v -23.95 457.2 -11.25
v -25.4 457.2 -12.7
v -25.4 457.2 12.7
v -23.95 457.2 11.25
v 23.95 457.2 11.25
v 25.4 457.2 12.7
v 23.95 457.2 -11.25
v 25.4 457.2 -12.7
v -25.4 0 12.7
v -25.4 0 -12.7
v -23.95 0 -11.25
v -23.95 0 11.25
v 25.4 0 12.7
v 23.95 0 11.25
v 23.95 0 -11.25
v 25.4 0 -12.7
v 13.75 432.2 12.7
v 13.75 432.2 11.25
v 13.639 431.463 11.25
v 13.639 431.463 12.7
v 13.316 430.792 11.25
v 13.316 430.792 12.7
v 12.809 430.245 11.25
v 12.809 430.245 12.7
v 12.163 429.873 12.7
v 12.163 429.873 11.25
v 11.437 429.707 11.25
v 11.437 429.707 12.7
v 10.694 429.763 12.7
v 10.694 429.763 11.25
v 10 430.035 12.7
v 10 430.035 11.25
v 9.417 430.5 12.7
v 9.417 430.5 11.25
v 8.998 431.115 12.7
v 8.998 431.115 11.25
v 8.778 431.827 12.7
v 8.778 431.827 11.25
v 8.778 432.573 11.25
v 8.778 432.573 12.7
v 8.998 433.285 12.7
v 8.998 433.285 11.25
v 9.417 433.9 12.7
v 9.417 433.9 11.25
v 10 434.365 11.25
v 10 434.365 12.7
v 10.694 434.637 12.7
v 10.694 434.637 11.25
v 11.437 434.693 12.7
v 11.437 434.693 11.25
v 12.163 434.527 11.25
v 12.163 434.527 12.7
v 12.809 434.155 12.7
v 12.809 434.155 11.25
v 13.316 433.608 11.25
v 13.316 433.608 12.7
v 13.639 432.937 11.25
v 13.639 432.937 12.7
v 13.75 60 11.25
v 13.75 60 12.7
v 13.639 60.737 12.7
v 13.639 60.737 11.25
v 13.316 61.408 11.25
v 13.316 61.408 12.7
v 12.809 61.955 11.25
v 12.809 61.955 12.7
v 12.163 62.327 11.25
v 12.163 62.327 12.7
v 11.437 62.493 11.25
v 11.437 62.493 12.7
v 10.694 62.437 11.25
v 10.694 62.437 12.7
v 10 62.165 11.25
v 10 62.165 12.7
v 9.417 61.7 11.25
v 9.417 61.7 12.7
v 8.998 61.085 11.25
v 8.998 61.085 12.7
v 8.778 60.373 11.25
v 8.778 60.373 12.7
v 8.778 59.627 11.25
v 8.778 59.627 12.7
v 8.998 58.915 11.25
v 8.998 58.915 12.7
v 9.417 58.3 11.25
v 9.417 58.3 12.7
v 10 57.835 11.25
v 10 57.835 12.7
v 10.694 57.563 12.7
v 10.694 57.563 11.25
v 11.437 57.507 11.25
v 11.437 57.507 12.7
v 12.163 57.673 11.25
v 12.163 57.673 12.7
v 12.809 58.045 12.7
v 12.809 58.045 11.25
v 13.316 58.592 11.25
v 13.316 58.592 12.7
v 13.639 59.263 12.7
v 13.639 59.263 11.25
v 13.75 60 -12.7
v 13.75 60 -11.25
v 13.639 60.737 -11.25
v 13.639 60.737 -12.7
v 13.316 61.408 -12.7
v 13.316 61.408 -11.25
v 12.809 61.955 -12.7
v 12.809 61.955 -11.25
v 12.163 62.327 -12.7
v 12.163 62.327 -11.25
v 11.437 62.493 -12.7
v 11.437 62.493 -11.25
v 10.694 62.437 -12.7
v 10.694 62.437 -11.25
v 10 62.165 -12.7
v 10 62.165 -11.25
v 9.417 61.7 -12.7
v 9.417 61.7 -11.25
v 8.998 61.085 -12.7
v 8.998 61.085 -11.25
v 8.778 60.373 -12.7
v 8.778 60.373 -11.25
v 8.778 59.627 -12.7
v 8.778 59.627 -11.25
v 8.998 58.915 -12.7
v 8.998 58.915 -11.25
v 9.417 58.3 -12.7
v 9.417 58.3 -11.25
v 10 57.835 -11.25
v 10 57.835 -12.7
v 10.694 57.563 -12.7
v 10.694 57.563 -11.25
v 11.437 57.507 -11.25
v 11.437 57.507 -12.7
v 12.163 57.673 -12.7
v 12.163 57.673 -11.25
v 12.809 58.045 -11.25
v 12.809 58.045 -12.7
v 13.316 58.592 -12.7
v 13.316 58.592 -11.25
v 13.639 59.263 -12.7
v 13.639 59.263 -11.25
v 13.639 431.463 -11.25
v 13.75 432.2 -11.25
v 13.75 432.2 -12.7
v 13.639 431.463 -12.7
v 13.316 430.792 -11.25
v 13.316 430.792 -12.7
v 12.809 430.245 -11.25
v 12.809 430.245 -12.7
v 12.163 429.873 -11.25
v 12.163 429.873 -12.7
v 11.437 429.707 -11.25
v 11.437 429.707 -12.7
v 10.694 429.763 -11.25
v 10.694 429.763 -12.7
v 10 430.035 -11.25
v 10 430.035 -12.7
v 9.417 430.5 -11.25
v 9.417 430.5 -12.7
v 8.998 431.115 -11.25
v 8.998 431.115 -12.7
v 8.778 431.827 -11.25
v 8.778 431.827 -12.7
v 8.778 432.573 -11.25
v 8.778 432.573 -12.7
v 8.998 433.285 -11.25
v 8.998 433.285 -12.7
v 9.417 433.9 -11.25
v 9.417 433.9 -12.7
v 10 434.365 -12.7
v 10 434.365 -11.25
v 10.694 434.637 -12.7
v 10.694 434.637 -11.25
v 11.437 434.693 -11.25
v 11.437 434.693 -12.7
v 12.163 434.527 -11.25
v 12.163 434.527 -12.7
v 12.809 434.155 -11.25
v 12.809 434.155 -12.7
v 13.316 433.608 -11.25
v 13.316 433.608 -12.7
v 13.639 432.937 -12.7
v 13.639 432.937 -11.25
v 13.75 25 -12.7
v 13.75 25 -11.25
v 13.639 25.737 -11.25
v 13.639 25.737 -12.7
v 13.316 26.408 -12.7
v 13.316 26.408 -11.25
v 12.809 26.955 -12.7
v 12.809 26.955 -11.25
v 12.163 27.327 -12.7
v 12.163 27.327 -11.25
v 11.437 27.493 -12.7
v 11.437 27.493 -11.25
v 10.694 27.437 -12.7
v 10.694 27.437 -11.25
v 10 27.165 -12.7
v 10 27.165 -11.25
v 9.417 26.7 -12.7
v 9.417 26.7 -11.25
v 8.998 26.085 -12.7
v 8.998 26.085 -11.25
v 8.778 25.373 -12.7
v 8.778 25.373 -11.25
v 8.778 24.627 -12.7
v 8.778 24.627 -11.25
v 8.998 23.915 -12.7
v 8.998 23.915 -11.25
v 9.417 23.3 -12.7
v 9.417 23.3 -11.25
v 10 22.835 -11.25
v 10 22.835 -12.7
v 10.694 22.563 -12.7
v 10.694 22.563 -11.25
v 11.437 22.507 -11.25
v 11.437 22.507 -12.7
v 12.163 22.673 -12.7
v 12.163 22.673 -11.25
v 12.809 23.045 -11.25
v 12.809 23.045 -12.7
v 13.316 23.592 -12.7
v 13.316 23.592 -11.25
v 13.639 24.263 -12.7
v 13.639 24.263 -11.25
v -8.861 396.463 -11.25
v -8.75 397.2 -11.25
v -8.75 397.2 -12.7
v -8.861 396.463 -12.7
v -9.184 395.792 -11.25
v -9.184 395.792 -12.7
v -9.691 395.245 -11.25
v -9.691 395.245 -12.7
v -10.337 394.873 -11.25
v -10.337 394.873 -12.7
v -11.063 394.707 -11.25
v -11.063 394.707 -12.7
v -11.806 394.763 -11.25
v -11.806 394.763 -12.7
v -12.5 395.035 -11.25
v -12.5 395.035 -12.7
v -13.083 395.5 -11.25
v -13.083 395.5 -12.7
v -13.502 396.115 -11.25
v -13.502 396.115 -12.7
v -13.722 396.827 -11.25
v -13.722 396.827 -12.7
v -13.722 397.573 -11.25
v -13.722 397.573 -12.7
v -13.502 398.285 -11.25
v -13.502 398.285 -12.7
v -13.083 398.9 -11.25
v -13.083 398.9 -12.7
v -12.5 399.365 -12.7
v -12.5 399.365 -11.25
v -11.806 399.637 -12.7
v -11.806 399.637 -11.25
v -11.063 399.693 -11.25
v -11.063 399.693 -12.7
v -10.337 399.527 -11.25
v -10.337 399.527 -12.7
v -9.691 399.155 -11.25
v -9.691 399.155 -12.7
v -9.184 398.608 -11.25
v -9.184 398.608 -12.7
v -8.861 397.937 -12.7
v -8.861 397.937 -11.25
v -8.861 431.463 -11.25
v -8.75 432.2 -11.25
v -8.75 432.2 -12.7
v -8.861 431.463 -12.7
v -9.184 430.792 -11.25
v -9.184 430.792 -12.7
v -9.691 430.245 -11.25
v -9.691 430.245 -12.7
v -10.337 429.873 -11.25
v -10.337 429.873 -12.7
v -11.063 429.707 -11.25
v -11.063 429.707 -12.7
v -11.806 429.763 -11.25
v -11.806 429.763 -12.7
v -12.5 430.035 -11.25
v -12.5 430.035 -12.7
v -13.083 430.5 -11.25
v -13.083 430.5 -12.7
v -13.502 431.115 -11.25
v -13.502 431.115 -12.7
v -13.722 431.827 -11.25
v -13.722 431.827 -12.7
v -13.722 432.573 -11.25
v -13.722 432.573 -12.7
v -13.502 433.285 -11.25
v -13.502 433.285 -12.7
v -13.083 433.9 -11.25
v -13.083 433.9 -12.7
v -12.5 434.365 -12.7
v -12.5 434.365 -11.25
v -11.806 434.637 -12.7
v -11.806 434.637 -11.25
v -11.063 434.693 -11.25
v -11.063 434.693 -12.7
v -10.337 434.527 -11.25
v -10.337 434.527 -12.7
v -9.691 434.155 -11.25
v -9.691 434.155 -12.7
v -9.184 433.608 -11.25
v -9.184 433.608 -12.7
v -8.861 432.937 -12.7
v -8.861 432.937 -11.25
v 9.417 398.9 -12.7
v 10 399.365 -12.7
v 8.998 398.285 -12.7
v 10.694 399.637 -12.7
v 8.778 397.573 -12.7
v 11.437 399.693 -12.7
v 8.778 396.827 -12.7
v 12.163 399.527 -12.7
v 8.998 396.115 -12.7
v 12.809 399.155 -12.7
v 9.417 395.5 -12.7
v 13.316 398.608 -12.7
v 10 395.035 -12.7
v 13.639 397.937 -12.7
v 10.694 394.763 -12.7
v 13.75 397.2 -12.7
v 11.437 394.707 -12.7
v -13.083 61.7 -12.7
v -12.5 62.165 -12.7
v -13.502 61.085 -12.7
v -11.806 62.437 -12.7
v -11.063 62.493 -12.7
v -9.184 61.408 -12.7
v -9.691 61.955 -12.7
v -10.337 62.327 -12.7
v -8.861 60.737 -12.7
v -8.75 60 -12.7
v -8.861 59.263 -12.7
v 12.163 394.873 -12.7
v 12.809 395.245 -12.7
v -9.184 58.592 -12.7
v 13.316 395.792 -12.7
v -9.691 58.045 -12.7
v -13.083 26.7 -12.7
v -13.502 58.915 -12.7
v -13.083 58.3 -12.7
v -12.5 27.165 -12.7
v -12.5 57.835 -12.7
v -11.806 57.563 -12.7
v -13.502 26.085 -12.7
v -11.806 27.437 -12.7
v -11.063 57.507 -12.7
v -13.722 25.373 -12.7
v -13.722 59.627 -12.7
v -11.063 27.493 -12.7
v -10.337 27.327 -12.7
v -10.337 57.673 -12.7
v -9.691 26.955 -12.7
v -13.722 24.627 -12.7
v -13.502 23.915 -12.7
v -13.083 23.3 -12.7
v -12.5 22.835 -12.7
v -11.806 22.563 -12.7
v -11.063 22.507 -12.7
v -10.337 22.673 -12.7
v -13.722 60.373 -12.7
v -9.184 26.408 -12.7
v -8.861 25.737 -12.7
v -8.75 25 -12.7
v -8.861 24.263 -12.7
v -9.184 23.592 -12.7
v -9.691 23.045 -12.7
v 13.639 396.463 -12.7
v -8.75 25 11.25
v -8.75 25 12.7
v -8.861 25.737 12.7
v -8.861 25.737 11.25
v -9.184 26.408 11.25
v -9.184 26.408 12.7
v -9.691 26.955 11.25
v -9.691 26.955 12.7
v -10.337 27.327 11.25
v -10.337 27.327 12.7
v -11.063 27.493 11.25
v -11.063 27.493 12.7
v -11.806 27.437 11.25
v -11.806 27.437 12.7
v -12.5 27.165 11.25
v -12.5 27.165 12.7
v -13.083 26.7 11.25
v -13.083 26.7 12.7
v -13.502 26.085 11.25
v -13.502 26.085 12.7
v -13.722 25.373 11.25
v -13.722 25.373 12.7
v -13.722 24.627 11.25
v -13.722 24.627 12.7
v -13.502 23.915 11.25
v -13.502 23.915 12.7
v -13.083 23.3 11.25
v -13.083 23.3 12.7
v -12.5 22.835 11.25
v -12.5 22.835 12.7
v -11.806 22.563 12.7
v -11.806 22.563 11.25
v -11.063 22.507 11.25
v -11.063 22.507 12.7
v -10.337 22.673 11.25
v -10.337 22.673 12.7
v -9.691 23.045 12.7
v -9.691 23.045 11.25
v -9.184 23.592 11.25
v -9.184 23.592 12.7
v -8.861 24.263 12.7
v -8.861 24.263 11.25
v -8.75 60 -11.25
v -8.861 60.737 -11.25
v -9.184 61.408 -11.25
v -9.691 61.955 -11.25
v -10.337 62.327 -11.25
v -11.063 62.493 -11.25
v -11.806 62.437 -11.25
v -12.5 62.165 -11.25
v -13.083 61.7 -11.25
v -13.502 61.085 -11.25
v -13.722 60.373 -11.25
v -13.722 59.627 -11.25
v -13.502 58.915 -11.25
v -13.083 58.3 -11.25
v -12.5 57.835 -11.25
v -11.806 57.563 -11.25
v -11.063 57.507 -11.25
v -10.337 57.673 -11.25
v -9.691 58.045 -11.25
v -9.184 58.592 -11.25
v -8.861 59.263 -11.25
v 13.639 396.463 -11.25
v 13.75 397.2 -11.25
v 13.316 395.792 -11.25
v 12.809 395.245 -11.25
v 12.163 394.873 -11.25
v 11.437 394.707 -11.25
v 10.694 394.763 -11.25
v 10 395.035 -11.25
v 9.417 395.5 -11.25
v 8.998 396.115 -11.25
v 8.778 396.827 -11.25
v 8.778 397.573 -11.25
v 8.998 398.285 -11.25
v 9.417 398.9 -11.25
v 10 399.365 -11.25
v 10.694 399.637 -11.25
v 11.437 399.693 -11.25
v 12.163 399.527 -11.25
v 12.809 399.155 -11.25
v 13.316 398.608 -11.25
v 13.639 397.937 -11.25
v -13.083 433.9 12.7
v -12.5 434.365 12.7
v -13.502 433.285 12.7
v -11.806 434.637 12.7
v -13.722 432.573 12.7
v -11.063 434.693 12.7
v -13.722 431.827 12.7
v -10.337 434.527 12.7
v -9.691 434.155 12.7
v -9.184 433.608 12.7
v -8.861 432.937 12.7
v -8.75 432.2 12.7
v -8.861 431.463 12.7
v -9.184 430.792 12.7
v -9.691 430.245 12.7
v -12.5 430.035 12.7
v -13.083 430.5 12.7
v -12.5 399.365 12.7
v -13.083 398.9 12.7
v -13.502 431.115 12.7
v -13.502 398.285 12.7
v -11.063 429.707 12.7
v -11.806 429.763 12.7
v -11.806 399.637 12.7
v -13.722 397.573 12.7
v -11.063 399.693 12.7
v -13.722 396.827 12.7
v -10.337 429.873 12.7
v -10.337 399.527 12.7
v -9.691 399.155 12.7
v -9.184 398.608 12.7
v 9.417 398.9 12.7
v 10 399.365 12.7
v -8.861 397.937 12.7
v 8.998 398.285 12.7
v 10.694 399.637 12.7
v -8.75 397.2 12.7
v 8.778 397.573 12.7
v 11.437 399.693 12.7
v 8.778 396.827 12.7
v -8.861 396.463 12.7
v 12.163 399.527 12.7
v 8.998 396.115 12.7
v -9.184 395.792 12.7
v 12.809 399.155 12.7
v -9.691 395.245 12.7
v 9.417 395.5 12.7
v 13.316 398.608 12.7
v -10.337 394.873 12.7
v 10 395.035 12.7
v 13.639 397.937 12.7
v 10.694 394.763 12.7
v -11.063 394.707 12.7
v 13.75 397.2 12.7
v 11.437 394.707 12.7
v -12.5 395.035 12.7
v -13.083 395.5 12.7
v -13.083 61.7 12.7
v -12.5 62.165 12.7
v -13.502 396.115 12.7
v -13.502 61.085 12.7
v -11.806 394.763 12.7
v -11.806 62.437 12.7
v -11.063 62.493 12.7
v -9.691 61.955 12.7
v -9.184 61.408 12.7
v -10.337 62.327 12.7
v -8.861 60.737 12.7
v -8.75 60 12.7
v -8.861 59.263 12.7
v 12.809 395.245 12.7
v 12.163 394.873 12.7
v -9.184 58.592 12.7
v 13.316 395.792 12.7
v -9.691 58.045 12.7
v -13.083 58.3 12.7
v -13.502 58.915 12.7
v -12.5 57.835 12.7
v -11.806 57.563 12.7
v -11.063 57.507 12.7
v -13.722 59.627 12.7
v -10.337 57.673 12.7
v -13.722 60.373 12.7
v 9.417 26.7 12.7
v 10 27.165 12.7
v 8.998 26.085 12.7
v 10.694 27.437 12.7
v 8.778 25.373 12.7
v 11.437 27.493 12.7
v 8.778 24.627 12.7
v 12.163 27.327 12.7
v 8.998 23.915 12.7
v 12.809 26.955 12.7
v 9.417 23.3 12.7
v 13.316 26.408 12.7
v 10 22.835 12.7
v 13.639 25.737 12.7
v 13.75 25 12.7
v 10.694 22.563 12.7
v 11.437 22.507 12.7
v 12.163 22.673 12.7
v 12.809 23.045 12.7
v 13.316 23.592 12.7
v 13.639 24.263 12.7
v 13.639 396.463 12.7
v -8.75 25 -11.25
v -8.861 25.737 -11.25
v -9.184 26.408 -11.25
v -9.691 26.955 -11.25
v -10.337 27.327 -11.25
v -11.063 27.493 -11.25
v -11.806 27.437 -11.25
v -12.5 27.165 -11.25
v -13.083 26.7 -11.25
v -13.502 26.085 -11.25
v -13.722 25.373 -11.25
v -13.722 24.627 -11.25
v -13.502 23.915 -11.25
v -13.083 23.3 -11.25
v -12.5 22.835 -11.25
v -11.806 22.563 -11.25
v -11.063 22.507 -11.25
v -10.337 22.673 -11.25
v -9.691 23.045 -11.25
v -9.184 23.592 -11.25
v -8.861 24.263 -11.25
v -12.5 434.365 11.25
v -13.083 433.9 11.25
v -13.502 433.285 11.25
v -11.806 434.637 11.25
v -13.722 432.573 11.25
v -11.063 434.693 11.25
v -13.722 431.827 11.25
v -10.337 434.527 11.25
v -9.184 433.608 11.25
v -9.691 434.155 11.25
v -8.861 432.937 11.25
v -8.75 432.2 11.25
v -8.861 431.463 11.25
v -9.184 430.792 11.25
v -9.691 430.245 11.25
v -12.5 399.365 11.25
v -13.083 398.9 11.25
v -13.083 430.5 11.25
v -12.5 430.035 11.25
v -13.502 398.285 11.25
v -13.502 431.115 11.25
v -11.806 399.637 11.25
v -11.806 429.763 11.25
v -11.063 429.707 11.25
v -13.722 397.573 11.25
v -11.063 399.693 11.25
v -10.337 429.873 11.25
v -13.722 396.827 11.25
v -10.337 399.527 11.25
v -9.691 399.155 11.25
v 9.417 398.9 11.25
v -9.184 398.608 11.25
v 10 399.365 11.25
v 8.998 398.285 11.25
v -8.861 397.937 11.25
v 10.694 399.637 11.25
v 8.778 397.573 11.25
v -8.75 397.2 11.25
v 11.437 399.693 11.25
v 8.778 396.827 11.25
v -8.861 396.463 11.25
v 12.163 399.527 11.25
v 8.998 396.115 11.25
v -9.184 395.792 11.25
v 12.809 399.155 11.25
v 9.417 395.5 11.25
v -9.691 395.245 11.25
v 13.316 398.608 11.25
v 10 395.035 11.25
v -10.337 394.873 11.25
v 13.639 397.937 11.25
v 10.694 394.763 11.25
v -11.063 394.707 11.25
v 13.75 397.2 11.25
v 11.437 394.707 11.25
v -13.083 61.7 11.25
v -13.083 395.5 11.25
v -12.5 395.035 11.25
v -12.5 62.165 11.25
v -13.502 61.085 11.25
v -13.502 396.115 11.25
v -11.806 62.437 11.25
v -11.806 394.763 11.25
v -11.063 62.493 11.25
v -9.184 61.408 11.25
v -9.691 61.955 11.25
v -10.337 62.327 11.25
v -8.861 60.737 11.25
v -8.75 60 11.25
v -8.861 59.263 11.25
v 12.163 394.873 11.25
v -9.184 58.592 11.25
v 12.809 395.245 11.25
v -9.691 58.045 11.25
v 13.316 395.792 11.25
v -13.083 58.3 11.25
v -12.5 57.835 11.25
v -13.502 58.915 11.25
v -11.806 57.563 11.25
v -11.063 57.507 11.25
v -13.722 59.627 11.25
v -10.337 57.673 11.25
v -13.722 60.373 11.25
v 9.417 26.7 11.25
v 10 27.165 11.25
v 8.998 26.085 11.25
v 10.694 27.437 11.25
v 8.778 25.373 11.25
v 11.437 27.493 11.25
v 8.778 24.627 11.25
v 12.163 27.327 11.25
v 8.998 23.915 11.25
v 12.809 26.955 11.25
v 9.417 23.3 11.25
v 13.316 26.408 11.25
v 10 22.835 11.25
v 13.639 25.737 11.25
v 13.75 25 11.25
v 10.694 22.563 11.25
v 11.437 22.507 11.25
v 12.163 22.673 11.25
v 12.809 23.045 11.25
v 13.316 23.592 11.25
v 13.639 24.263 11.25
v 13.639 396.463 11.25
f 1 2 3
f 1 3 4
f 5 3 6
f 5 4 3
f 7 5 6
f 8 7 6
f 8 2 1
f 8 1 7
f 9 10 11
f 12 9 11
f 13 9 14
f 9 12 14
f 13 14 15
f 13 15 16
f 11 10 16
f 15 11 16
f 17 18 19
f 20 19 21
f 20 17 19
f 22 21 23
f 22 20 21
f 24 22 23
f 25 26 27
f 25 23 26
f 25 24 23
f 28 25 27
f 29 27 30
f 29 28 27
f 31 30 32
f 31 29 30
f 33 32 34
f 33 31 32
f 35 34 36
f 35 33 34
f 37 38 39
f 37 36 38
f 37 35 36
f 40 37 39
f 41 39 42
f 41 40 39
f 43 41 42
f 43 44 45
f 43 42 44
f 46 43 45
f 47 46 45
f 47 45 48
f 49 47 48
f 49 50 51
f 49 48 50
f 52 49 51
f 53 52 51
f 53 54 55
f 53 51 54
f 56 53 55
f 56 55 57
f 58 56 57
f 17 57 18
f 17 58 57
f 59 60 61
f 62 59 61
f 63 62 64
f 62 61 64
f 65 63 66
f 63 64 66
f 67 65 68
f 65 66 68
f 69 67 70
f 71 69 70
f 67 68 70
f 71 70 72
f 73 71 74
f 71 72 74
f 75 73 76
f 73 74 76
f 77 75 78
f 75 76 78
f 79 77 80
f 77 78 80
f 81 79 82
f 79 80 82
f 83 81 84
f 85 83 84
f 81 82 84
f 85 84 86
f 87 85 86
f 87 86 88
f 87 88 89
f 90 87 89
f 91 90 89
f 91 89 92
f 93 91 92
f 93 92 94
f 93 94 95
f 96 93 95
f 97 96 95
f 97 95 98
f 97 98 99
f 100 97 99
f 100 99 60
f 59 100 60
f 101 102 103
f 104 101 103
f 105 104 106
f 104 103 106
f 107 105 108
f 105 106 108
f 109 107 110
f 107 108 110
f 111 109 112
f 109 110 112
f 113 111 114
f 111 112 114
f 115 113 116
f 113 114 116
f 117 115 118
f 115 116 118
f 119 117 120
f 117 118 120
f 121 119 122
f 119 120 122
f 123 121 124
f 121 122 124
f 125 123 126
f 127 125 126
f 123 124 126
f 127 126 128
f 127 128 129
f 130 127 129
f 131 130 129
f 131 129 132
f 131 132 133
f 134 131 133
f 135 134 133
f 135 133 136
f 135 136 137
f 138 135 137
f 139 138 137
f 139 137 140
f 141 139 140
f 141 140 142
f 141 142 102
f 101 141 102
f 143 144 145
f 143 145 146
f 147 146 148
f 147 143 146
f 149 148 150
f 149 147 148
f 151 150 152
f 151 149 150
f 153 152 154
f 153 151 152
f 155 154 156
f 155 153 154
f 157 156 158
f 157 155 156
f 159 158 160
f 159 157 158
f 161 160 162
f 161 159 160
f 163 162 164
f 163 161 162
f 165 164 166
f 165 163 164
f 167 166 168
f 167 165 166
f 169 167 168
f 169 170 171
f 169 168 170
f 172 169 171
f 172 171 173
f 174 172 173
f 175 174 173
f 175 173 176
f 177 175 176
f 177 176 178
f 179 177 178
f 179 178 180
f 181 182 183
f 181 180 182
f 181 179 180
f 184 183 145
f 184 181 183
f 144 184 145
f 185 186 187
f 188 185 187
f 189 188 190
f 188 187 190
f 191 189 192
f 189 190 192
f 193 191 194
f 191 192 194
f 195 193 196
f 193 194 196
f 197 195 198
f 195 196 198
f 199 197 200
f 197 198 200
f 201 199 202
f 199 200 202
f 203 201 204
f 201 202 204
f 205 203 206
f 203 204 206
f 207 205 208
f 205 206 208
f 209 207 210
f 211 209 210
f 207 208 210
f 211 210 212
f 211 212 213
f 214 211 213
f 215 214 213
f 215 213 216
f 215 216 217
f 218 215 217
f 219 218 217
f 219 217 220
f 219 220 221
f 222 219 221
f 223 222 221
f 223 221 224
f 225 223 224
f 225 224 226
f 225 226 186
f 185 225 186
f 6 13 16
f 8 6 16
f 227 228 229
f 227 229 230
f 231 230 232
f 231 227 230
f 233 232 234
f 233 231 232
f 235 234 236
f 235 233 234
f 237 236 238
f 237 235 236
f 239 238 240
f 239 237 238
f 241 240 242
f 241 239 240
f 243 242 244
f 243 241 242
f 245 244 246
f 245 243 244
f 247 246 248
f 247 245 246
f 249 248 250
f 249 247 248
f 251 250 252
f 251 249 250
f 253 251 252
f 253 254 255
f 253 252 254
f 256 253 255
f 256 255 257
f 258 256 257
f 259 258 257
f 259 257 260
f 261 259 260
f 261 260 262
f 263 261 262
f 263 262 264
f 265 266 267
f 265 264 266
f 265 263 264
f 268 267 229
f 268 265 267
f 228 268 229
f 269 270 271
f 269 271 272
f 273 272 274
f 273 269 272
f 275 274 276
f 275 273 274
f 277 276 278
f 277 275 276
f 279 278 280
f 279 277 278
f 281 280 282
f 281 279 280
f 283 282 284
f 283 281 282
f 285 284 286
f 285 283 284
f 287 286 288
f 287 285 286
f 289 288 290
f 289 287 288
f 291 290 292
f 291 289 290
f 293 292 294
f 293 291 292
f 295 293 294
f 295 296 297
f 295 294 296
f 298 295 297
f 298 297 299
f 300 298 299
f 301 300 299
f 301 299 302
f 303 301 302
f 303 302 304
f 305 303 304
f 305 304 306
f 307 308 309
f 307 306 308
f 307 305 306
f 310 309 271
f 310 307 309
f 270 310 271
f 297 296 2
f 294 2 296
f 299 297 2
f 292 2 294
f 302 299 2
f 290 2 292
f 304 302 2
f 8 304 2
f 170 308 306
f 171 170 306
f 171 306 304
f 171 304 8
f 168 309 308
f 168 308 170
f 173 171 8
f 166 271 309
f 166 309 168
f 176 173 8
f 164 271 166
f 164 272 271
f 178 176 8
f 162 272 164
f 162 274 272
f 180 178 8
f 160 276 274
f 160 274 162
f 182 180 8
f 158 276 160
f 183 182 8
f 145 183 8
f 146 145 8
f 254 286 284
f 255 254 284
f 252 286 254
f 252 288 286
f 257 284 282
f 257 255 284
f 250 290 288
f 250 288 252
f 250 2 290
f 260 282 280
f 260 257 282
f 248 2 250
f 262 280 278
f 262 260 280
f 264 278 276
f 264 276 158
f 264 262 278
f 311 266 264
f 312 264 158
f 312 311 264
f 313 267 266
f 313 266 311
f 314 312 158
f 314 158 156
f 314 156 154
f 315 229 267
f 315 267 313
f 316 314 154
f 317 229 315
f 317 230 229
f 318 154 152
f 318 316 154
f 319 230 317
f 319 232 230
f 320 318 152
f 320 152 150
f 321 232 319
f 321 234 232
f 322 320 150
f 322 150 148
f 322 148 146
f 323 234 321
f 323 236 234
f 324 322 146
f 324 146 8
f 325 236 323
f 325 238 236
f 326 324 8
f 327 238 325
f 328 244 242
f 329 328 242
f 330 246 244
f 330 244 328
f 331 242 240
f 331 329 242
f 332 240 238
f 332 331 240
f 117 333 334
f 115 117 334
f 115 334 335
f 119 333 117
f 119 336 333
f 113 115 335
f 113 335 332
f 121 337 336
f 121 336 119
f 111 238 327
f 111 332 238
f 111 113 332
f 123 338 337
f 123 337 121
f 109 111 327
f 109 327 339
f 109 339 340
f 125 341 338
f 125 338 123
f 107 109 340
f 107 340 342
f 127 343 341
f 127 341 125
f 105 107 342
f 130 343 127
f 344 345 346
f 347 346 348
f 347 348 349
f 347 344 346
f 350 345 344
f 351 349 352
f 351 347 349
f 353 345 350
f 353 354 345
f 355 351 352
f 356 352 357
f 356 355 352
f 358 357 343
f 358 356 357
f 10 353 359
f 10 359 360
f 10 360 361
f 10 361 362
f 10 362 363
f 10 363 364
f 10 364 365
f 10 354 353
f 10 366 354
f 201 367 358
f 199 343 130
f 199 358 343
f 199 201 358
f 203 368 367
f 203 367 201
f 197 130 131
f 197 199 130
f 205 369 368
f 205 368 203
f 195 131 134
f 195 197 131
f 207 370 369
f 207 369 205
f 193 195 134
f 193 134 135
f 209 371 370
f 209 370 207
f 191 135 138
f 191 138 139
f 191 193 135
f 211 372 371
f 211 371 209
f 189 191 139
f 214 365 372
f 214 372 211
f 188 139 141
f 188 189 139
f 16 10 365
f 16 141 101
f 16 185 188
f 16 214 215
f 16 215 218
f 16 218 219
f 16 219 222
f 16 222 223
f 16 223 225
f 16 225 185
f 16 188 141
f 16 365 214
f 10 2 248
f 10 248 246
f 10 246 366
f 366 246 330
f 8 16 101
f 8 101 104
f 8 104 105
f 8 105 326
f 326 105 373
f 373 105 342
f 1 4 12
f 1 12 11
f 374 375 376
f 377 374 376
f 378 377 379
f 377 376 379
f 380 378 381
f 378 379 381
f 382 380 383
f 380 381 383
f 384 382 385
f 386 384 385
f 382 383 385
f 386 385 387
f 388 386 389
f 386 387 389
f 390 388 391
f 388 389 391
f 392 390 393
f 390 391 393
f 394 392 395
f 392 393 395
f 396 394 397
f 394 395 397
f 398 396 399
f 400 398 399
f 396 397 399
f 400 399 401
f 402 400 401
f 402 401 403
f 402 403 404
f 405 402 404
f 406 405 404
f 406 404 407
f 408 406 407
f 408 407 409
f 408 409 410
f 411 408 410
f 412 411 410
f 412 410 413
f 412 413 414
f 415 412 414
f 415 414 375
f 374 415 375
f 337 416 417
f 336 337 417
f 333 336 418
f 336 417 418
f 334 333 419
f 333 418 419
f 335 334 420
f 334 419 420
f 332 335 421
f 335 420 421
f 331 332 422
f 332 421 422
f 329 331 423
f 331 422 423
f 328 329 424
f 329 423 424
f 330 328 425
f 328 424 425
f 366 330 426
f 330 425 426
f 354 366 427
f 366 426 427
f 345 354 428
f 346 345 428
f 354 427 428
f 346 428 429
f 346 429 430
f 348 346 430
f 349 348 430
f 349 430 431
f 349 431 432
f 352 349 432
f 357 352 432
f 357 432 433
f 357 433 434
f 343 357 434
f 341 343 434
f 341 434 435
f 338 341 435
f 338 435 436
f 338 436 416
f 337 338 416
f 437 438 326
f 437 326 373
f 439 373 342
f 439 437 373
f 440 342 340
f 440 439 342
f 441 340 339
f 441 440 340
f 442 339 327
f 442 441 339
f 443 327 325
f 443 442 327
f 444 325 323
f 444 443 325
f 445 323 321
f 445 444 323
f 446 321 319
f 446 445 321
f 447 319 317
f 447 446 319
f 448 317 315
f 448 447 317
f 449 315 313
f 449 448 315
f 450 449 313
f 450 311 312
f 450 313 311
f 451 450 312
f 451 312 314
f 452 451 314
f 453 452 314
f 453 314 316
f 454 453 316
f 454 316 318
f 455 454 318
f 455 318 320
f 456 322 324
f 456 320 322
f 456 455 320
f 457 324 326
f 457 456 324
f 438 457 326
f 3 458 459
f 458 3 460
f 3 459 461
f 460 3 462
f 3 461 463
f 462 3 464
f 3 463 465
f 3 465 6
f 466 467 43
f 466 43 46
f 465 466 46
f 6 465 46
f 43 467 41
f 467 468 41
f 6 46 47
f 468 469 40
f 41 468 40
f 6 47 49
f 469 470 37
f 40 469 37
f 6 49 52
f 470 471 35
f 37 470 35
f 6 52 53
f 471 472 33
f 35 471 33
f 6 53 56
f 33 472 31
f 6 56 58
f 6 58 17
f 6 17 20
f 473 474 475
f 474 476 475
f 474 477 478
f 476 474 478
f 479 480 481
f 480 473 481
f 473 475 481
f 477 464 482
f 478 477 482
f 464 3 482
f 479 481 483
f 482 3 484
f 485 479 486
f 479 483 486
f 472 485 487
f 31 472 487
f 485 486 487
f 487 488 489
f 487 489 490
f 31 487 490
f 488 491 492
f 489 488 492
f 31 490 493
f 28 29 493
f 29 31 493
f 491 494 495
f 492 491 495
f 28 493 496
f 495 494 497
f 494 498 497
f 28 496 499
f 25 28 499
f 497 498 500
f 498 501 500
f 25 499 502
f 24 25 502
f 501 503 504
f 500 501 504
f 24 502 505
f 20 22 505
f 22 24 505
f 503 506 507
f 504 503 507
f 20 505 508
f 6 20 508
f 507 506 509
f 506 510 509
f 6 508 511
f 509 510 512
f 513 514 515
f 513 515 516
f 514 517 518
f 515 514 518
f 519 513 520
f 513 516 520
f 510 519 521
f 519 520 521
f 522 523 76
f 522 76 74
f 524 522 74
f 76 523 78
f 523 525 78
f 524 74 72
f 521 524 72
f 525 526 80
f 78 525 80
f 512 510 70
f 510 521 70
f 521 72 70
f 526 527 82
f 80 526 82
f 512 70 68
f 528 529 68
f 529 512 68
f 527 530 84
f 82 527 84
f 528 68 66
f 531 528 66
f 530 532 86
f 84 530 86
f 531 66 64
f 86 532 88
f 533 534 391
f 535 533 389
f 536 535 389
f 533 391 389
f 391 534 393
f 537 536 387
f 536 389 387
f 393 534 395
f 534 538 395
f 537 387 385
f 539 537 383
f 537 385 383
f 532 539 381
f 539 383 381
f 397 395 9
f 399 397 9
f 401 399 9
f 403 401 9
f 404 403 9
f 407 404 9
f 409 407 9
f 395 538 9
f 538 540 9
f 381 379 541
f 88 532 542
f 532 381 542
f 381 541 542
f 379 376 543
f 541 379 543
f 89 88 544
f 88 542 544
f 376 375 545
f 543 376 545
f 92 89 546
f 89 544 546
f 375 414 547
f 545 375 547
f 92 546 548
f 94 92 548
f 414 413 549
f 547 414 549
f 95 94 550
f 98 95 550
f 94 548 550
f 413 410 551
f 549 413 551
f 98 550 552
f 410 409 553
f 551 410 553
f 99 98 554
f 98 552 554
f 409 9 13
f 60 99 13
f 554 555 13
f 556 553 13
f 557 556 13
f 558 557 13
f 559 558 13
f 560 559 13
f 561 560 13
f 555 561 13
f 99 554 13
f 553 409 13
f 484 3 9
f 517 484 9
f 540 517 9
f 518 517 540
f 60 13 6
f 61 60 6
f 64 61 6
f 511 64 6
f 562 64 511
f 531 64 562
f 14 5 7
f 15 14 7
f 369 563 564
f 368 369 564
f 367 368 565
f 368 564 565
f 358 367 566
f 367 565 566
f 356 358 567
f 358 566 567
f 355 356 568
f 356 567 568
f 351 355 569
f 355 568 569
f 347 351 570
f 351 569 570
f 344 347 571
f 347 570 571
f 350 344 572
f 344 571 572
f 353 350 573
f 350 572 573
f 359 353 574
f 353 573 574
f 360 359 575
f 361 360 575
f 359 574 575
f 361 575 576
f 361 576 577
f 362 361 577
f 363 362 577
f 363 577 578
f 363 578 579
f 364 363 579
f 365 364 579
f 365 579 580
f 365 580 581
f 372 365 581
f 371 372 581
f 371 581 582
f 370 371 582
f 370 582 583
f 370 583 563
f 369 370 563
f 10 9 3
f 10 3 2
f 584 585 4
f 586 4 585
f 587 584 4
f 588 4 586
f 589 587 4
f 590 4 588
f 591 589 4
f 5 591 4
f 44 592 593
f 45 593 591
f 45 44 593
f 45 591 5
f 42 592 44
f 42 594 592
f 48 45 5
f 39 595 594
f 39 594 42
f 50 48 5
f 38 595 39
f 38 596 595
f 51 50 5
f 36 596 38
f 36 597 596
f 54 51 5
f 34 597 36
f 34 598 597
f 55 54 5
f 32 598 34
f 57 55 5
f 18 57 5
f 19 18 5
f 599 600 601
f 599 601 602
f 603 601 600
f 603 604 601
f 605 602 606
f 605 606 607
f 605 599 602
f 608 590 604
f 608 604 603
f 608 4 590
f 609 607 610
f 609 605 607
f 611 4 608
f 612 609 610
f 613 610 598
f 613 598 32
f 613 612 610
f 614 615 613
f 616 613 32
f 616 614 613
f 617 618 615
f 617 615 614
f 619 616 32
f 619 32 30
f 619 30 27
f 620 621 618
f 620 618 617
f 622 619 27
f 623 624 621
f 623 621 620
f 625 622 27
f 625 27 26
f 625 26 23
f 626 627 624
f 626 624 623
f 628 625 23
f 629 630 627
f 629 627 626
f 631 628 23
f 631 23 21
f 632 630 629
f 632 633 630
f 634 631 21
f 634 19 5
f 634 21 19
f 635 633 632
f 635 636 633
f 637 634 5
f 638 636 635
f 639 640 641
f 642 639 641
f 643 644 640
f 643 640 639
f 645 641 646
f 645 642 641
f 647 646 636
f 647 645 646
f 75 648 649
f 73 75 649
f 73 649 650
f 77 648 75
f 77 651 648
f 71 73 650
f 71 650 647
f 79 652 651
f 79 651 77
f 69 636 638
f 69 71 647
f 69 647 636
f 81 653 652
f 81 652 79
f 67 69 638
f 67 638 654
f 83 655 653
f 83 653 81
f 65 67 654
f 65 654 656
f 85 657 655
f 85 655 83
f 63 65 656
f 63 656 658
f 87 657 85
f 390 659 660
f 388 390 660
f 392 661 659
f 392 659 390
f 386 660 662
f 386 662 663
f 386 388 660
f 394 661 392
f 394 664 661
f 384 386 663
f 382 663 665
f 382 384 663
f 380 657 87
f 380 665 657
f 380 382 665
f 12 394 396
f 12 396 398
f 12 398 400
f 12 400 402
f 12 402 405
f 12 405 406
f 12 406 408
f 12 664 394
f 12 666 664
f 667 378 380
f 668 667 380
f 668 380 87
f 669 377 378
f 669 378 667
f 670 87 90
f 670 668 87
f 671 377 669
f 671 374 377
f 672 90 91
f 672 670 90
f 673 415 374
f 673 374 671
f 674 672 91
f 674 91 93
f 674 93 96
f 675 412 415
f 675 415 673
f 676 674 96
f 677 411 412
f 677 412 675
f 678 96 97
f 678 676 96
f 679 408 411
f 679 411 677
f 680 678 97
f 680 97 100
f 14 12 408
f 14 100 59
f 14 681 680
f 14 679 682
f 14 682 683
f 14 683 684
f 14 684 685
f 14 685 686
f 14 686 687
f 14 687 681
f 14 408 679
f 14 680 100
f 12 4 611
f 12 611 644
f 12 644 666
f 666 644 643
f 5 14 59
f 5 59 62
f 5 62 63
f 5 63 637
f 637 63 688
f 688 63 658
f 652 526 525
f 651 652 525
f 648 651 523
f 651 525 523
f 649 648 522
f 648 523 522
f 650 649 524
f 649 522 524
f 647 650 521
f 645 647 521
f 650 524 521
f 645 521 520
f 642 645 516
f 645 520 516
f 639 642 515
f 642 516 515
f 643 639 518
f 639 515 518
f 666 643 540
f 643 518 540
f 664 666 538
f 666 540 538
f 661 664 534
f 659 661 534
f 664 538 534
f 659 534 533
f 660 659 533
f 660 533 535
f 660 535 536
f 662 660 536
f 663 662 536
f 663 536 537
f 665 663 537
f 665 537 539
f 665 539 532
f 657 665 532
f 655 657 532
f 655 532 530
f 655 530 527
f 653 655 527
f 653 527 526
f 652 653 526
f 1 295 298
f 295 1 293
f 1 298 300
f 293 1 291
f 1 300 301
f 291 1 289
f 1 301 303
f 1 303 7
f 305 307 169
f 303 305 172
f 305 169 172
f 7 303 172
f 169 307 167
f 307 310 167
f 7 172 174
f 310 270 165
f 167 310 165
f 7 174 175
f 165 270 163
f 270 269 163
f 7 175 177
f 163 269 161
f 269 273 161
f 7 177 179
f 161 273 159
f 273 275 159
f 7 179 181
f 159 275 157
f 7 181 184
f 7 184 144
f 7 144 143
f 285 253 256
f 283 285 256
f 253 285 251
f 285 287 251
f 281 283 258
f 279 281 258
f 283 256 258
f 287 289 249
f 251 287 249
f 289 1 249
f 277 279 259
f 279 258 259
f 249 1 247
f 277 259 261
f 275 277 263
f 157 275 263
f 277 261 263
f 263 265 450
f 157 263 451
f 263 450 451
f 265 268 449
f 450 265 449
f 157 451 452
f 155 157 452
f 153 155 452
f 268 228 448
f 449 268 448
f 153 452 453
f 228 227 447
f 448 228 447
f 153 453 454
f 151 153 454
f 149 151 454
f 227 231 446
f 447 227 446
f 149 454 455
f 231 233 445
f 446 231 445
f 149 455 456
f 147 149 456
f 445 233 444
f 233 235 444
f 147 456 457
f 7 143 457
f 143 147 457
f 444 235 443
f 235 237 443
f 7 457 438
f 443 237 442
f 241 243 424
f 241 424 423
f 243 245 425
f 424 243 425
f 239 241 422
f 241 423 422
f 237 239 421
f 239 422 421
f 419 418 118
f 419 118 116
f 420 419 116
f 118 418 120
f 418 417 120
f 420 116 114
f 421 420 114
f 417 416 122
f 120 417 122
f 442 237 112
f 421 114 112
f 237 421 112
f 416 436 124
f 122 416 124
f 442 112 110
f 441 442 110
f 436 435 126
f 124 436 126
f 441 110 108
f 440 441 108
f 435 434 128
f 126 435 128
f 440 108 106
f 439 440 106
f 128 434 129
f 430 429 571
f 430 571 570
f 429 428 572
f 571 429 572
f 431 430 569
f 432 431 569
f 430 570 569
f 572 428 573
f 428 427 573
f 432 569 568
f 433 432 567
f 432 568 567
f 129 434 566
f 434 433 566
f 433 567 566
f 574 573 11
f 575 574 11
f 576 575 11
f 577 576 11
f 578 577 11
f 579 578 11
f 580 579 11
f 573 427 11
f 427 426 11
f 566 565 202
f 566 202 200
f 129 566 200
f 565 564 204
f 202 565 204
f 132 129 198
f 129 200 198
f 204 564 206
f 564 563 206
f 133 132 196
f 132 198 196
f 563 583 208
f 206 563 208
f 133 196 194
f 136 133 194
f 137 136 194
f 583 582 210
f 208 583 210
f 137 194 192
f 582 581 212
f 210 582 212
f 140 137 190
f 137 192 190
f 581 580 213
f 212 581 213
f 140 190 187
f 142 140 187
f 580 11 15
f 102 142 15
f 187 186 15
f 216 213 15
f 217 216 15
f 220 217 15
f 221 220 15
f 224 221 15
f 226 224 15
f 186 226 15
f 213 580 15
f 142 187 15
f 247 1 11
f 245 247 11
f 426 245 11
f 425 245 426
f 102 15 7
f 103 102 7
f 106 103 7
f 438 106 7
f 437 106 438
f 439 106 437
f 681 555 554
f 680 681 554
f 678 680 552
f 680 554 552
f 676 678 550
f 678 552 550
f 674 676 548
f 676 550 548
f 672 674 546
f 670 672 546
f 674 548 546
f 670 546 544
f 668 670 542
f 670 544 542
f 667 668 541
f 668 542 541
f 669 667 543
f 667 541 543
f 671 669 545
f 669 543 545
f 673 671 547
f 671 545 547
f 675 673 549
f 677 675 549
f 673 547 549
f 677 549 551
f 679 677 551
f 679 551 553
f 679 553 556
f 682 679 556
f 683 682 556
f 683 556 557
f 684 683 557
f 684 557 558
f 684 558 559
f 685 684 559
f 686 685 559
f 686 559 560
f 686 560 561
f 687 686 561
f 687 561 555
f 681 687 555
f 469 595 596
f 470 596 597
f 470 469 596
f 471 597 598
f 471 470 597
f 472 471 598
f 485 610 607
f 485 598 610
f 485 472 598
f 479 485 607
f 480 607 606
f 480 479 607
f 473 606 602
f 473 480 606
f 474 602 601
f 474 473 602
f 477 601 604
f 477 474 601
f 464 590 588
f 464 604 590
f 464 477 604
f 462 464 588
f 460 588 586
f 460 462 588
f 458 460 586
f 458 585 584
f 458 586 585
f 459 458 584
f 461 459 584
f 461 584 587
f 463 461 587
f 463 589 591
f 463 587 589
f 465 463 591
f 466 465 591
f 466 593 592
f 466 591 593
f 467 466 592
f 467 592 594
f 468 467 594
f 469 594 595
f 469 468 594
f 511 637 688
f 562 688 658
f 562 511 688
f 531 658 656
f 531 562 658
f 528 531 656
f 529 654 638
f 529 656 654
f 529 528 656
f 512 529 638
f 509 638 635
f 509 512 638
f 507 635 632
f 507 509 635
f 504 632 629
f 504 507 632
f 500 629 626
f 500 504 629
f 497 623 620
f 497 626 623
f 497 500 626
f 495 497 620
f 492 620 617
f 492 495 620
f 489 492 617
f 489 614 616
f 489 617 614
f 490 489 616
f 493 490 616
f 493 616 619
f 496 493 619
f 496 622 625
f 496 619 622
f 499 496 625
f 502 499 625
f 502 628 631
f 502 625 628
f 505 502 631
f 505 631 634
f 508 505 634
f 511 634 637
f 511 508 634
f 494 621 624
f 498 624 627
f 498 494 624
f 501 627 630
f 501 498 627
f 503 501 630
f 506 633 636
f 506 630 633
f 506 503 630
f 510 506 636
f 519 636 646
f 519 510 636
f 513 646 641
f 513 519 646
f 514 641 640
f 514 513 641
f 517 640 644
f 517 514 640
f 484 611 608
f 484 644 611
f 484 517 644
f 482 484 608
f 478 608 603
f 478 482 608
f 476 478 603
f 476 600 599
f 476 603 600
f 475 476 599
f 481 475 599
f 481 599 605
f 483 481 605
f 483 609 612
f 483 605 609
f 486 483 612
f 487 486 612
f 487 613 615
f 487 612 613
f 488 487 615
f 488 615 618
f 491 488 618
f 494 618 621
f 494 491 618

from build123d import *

# Parameters (mm, degrees)
SKETCH1_W           = 50.8
SKETCH1_H           = 25.4
SKETCH1_W_2         = 47.9
SKETCH1_H_2         = 22.5
BOSS_EXTRUDE1_DEPTH = 457.2
SKETCH2_R           = 2.5
CUT_EXTRUDE1_DEPTH  = 459.608940166


with BuildPart() as part:
    # Sketch1 → Boss-Extrude1 (new body)
    with BuildSketch(Plane(origin=(0, 0, 0), x_dir=(1, 0, 0), z_dir=(0, 1, 0))):
        Rectangle(SKETCH1_W, SKETCH1_H)
        Rectangle(SKETCH1_W_2, SKETCH1_H_2, mode=Mode.SUBTRACT)
    extrude(amount=BOSS_EXTRUDE1_DEPTH)

    # Sketch2 → Cut-Extrude1 (cut, through all)
    with BuildSketch(Plane.XY.offset(12.7)):
        with Locations((-11.25, 60)):
            Circle(SKETCH2_R)
        with Locations((-11.25, 25)):
            Circle(SKETCH2_R)
        with Locations((11.25, 25)):
            Circle(SKETCH2_R)
        with Locations((11.25, 60)):
            Circle(SKETCH2_R)
    cut_extrude1 = extrude(amount=-CUT_EXTRUDE1_DEPTH, mode=Mode.SUBTRACT)

    # Mirror1: Cut-Extrude1 across plane
    add(cut_extrude1.mirror(Plane.ZX.offset(228.6)), mode=Mode.SUBTRACT)


solid = part.part
